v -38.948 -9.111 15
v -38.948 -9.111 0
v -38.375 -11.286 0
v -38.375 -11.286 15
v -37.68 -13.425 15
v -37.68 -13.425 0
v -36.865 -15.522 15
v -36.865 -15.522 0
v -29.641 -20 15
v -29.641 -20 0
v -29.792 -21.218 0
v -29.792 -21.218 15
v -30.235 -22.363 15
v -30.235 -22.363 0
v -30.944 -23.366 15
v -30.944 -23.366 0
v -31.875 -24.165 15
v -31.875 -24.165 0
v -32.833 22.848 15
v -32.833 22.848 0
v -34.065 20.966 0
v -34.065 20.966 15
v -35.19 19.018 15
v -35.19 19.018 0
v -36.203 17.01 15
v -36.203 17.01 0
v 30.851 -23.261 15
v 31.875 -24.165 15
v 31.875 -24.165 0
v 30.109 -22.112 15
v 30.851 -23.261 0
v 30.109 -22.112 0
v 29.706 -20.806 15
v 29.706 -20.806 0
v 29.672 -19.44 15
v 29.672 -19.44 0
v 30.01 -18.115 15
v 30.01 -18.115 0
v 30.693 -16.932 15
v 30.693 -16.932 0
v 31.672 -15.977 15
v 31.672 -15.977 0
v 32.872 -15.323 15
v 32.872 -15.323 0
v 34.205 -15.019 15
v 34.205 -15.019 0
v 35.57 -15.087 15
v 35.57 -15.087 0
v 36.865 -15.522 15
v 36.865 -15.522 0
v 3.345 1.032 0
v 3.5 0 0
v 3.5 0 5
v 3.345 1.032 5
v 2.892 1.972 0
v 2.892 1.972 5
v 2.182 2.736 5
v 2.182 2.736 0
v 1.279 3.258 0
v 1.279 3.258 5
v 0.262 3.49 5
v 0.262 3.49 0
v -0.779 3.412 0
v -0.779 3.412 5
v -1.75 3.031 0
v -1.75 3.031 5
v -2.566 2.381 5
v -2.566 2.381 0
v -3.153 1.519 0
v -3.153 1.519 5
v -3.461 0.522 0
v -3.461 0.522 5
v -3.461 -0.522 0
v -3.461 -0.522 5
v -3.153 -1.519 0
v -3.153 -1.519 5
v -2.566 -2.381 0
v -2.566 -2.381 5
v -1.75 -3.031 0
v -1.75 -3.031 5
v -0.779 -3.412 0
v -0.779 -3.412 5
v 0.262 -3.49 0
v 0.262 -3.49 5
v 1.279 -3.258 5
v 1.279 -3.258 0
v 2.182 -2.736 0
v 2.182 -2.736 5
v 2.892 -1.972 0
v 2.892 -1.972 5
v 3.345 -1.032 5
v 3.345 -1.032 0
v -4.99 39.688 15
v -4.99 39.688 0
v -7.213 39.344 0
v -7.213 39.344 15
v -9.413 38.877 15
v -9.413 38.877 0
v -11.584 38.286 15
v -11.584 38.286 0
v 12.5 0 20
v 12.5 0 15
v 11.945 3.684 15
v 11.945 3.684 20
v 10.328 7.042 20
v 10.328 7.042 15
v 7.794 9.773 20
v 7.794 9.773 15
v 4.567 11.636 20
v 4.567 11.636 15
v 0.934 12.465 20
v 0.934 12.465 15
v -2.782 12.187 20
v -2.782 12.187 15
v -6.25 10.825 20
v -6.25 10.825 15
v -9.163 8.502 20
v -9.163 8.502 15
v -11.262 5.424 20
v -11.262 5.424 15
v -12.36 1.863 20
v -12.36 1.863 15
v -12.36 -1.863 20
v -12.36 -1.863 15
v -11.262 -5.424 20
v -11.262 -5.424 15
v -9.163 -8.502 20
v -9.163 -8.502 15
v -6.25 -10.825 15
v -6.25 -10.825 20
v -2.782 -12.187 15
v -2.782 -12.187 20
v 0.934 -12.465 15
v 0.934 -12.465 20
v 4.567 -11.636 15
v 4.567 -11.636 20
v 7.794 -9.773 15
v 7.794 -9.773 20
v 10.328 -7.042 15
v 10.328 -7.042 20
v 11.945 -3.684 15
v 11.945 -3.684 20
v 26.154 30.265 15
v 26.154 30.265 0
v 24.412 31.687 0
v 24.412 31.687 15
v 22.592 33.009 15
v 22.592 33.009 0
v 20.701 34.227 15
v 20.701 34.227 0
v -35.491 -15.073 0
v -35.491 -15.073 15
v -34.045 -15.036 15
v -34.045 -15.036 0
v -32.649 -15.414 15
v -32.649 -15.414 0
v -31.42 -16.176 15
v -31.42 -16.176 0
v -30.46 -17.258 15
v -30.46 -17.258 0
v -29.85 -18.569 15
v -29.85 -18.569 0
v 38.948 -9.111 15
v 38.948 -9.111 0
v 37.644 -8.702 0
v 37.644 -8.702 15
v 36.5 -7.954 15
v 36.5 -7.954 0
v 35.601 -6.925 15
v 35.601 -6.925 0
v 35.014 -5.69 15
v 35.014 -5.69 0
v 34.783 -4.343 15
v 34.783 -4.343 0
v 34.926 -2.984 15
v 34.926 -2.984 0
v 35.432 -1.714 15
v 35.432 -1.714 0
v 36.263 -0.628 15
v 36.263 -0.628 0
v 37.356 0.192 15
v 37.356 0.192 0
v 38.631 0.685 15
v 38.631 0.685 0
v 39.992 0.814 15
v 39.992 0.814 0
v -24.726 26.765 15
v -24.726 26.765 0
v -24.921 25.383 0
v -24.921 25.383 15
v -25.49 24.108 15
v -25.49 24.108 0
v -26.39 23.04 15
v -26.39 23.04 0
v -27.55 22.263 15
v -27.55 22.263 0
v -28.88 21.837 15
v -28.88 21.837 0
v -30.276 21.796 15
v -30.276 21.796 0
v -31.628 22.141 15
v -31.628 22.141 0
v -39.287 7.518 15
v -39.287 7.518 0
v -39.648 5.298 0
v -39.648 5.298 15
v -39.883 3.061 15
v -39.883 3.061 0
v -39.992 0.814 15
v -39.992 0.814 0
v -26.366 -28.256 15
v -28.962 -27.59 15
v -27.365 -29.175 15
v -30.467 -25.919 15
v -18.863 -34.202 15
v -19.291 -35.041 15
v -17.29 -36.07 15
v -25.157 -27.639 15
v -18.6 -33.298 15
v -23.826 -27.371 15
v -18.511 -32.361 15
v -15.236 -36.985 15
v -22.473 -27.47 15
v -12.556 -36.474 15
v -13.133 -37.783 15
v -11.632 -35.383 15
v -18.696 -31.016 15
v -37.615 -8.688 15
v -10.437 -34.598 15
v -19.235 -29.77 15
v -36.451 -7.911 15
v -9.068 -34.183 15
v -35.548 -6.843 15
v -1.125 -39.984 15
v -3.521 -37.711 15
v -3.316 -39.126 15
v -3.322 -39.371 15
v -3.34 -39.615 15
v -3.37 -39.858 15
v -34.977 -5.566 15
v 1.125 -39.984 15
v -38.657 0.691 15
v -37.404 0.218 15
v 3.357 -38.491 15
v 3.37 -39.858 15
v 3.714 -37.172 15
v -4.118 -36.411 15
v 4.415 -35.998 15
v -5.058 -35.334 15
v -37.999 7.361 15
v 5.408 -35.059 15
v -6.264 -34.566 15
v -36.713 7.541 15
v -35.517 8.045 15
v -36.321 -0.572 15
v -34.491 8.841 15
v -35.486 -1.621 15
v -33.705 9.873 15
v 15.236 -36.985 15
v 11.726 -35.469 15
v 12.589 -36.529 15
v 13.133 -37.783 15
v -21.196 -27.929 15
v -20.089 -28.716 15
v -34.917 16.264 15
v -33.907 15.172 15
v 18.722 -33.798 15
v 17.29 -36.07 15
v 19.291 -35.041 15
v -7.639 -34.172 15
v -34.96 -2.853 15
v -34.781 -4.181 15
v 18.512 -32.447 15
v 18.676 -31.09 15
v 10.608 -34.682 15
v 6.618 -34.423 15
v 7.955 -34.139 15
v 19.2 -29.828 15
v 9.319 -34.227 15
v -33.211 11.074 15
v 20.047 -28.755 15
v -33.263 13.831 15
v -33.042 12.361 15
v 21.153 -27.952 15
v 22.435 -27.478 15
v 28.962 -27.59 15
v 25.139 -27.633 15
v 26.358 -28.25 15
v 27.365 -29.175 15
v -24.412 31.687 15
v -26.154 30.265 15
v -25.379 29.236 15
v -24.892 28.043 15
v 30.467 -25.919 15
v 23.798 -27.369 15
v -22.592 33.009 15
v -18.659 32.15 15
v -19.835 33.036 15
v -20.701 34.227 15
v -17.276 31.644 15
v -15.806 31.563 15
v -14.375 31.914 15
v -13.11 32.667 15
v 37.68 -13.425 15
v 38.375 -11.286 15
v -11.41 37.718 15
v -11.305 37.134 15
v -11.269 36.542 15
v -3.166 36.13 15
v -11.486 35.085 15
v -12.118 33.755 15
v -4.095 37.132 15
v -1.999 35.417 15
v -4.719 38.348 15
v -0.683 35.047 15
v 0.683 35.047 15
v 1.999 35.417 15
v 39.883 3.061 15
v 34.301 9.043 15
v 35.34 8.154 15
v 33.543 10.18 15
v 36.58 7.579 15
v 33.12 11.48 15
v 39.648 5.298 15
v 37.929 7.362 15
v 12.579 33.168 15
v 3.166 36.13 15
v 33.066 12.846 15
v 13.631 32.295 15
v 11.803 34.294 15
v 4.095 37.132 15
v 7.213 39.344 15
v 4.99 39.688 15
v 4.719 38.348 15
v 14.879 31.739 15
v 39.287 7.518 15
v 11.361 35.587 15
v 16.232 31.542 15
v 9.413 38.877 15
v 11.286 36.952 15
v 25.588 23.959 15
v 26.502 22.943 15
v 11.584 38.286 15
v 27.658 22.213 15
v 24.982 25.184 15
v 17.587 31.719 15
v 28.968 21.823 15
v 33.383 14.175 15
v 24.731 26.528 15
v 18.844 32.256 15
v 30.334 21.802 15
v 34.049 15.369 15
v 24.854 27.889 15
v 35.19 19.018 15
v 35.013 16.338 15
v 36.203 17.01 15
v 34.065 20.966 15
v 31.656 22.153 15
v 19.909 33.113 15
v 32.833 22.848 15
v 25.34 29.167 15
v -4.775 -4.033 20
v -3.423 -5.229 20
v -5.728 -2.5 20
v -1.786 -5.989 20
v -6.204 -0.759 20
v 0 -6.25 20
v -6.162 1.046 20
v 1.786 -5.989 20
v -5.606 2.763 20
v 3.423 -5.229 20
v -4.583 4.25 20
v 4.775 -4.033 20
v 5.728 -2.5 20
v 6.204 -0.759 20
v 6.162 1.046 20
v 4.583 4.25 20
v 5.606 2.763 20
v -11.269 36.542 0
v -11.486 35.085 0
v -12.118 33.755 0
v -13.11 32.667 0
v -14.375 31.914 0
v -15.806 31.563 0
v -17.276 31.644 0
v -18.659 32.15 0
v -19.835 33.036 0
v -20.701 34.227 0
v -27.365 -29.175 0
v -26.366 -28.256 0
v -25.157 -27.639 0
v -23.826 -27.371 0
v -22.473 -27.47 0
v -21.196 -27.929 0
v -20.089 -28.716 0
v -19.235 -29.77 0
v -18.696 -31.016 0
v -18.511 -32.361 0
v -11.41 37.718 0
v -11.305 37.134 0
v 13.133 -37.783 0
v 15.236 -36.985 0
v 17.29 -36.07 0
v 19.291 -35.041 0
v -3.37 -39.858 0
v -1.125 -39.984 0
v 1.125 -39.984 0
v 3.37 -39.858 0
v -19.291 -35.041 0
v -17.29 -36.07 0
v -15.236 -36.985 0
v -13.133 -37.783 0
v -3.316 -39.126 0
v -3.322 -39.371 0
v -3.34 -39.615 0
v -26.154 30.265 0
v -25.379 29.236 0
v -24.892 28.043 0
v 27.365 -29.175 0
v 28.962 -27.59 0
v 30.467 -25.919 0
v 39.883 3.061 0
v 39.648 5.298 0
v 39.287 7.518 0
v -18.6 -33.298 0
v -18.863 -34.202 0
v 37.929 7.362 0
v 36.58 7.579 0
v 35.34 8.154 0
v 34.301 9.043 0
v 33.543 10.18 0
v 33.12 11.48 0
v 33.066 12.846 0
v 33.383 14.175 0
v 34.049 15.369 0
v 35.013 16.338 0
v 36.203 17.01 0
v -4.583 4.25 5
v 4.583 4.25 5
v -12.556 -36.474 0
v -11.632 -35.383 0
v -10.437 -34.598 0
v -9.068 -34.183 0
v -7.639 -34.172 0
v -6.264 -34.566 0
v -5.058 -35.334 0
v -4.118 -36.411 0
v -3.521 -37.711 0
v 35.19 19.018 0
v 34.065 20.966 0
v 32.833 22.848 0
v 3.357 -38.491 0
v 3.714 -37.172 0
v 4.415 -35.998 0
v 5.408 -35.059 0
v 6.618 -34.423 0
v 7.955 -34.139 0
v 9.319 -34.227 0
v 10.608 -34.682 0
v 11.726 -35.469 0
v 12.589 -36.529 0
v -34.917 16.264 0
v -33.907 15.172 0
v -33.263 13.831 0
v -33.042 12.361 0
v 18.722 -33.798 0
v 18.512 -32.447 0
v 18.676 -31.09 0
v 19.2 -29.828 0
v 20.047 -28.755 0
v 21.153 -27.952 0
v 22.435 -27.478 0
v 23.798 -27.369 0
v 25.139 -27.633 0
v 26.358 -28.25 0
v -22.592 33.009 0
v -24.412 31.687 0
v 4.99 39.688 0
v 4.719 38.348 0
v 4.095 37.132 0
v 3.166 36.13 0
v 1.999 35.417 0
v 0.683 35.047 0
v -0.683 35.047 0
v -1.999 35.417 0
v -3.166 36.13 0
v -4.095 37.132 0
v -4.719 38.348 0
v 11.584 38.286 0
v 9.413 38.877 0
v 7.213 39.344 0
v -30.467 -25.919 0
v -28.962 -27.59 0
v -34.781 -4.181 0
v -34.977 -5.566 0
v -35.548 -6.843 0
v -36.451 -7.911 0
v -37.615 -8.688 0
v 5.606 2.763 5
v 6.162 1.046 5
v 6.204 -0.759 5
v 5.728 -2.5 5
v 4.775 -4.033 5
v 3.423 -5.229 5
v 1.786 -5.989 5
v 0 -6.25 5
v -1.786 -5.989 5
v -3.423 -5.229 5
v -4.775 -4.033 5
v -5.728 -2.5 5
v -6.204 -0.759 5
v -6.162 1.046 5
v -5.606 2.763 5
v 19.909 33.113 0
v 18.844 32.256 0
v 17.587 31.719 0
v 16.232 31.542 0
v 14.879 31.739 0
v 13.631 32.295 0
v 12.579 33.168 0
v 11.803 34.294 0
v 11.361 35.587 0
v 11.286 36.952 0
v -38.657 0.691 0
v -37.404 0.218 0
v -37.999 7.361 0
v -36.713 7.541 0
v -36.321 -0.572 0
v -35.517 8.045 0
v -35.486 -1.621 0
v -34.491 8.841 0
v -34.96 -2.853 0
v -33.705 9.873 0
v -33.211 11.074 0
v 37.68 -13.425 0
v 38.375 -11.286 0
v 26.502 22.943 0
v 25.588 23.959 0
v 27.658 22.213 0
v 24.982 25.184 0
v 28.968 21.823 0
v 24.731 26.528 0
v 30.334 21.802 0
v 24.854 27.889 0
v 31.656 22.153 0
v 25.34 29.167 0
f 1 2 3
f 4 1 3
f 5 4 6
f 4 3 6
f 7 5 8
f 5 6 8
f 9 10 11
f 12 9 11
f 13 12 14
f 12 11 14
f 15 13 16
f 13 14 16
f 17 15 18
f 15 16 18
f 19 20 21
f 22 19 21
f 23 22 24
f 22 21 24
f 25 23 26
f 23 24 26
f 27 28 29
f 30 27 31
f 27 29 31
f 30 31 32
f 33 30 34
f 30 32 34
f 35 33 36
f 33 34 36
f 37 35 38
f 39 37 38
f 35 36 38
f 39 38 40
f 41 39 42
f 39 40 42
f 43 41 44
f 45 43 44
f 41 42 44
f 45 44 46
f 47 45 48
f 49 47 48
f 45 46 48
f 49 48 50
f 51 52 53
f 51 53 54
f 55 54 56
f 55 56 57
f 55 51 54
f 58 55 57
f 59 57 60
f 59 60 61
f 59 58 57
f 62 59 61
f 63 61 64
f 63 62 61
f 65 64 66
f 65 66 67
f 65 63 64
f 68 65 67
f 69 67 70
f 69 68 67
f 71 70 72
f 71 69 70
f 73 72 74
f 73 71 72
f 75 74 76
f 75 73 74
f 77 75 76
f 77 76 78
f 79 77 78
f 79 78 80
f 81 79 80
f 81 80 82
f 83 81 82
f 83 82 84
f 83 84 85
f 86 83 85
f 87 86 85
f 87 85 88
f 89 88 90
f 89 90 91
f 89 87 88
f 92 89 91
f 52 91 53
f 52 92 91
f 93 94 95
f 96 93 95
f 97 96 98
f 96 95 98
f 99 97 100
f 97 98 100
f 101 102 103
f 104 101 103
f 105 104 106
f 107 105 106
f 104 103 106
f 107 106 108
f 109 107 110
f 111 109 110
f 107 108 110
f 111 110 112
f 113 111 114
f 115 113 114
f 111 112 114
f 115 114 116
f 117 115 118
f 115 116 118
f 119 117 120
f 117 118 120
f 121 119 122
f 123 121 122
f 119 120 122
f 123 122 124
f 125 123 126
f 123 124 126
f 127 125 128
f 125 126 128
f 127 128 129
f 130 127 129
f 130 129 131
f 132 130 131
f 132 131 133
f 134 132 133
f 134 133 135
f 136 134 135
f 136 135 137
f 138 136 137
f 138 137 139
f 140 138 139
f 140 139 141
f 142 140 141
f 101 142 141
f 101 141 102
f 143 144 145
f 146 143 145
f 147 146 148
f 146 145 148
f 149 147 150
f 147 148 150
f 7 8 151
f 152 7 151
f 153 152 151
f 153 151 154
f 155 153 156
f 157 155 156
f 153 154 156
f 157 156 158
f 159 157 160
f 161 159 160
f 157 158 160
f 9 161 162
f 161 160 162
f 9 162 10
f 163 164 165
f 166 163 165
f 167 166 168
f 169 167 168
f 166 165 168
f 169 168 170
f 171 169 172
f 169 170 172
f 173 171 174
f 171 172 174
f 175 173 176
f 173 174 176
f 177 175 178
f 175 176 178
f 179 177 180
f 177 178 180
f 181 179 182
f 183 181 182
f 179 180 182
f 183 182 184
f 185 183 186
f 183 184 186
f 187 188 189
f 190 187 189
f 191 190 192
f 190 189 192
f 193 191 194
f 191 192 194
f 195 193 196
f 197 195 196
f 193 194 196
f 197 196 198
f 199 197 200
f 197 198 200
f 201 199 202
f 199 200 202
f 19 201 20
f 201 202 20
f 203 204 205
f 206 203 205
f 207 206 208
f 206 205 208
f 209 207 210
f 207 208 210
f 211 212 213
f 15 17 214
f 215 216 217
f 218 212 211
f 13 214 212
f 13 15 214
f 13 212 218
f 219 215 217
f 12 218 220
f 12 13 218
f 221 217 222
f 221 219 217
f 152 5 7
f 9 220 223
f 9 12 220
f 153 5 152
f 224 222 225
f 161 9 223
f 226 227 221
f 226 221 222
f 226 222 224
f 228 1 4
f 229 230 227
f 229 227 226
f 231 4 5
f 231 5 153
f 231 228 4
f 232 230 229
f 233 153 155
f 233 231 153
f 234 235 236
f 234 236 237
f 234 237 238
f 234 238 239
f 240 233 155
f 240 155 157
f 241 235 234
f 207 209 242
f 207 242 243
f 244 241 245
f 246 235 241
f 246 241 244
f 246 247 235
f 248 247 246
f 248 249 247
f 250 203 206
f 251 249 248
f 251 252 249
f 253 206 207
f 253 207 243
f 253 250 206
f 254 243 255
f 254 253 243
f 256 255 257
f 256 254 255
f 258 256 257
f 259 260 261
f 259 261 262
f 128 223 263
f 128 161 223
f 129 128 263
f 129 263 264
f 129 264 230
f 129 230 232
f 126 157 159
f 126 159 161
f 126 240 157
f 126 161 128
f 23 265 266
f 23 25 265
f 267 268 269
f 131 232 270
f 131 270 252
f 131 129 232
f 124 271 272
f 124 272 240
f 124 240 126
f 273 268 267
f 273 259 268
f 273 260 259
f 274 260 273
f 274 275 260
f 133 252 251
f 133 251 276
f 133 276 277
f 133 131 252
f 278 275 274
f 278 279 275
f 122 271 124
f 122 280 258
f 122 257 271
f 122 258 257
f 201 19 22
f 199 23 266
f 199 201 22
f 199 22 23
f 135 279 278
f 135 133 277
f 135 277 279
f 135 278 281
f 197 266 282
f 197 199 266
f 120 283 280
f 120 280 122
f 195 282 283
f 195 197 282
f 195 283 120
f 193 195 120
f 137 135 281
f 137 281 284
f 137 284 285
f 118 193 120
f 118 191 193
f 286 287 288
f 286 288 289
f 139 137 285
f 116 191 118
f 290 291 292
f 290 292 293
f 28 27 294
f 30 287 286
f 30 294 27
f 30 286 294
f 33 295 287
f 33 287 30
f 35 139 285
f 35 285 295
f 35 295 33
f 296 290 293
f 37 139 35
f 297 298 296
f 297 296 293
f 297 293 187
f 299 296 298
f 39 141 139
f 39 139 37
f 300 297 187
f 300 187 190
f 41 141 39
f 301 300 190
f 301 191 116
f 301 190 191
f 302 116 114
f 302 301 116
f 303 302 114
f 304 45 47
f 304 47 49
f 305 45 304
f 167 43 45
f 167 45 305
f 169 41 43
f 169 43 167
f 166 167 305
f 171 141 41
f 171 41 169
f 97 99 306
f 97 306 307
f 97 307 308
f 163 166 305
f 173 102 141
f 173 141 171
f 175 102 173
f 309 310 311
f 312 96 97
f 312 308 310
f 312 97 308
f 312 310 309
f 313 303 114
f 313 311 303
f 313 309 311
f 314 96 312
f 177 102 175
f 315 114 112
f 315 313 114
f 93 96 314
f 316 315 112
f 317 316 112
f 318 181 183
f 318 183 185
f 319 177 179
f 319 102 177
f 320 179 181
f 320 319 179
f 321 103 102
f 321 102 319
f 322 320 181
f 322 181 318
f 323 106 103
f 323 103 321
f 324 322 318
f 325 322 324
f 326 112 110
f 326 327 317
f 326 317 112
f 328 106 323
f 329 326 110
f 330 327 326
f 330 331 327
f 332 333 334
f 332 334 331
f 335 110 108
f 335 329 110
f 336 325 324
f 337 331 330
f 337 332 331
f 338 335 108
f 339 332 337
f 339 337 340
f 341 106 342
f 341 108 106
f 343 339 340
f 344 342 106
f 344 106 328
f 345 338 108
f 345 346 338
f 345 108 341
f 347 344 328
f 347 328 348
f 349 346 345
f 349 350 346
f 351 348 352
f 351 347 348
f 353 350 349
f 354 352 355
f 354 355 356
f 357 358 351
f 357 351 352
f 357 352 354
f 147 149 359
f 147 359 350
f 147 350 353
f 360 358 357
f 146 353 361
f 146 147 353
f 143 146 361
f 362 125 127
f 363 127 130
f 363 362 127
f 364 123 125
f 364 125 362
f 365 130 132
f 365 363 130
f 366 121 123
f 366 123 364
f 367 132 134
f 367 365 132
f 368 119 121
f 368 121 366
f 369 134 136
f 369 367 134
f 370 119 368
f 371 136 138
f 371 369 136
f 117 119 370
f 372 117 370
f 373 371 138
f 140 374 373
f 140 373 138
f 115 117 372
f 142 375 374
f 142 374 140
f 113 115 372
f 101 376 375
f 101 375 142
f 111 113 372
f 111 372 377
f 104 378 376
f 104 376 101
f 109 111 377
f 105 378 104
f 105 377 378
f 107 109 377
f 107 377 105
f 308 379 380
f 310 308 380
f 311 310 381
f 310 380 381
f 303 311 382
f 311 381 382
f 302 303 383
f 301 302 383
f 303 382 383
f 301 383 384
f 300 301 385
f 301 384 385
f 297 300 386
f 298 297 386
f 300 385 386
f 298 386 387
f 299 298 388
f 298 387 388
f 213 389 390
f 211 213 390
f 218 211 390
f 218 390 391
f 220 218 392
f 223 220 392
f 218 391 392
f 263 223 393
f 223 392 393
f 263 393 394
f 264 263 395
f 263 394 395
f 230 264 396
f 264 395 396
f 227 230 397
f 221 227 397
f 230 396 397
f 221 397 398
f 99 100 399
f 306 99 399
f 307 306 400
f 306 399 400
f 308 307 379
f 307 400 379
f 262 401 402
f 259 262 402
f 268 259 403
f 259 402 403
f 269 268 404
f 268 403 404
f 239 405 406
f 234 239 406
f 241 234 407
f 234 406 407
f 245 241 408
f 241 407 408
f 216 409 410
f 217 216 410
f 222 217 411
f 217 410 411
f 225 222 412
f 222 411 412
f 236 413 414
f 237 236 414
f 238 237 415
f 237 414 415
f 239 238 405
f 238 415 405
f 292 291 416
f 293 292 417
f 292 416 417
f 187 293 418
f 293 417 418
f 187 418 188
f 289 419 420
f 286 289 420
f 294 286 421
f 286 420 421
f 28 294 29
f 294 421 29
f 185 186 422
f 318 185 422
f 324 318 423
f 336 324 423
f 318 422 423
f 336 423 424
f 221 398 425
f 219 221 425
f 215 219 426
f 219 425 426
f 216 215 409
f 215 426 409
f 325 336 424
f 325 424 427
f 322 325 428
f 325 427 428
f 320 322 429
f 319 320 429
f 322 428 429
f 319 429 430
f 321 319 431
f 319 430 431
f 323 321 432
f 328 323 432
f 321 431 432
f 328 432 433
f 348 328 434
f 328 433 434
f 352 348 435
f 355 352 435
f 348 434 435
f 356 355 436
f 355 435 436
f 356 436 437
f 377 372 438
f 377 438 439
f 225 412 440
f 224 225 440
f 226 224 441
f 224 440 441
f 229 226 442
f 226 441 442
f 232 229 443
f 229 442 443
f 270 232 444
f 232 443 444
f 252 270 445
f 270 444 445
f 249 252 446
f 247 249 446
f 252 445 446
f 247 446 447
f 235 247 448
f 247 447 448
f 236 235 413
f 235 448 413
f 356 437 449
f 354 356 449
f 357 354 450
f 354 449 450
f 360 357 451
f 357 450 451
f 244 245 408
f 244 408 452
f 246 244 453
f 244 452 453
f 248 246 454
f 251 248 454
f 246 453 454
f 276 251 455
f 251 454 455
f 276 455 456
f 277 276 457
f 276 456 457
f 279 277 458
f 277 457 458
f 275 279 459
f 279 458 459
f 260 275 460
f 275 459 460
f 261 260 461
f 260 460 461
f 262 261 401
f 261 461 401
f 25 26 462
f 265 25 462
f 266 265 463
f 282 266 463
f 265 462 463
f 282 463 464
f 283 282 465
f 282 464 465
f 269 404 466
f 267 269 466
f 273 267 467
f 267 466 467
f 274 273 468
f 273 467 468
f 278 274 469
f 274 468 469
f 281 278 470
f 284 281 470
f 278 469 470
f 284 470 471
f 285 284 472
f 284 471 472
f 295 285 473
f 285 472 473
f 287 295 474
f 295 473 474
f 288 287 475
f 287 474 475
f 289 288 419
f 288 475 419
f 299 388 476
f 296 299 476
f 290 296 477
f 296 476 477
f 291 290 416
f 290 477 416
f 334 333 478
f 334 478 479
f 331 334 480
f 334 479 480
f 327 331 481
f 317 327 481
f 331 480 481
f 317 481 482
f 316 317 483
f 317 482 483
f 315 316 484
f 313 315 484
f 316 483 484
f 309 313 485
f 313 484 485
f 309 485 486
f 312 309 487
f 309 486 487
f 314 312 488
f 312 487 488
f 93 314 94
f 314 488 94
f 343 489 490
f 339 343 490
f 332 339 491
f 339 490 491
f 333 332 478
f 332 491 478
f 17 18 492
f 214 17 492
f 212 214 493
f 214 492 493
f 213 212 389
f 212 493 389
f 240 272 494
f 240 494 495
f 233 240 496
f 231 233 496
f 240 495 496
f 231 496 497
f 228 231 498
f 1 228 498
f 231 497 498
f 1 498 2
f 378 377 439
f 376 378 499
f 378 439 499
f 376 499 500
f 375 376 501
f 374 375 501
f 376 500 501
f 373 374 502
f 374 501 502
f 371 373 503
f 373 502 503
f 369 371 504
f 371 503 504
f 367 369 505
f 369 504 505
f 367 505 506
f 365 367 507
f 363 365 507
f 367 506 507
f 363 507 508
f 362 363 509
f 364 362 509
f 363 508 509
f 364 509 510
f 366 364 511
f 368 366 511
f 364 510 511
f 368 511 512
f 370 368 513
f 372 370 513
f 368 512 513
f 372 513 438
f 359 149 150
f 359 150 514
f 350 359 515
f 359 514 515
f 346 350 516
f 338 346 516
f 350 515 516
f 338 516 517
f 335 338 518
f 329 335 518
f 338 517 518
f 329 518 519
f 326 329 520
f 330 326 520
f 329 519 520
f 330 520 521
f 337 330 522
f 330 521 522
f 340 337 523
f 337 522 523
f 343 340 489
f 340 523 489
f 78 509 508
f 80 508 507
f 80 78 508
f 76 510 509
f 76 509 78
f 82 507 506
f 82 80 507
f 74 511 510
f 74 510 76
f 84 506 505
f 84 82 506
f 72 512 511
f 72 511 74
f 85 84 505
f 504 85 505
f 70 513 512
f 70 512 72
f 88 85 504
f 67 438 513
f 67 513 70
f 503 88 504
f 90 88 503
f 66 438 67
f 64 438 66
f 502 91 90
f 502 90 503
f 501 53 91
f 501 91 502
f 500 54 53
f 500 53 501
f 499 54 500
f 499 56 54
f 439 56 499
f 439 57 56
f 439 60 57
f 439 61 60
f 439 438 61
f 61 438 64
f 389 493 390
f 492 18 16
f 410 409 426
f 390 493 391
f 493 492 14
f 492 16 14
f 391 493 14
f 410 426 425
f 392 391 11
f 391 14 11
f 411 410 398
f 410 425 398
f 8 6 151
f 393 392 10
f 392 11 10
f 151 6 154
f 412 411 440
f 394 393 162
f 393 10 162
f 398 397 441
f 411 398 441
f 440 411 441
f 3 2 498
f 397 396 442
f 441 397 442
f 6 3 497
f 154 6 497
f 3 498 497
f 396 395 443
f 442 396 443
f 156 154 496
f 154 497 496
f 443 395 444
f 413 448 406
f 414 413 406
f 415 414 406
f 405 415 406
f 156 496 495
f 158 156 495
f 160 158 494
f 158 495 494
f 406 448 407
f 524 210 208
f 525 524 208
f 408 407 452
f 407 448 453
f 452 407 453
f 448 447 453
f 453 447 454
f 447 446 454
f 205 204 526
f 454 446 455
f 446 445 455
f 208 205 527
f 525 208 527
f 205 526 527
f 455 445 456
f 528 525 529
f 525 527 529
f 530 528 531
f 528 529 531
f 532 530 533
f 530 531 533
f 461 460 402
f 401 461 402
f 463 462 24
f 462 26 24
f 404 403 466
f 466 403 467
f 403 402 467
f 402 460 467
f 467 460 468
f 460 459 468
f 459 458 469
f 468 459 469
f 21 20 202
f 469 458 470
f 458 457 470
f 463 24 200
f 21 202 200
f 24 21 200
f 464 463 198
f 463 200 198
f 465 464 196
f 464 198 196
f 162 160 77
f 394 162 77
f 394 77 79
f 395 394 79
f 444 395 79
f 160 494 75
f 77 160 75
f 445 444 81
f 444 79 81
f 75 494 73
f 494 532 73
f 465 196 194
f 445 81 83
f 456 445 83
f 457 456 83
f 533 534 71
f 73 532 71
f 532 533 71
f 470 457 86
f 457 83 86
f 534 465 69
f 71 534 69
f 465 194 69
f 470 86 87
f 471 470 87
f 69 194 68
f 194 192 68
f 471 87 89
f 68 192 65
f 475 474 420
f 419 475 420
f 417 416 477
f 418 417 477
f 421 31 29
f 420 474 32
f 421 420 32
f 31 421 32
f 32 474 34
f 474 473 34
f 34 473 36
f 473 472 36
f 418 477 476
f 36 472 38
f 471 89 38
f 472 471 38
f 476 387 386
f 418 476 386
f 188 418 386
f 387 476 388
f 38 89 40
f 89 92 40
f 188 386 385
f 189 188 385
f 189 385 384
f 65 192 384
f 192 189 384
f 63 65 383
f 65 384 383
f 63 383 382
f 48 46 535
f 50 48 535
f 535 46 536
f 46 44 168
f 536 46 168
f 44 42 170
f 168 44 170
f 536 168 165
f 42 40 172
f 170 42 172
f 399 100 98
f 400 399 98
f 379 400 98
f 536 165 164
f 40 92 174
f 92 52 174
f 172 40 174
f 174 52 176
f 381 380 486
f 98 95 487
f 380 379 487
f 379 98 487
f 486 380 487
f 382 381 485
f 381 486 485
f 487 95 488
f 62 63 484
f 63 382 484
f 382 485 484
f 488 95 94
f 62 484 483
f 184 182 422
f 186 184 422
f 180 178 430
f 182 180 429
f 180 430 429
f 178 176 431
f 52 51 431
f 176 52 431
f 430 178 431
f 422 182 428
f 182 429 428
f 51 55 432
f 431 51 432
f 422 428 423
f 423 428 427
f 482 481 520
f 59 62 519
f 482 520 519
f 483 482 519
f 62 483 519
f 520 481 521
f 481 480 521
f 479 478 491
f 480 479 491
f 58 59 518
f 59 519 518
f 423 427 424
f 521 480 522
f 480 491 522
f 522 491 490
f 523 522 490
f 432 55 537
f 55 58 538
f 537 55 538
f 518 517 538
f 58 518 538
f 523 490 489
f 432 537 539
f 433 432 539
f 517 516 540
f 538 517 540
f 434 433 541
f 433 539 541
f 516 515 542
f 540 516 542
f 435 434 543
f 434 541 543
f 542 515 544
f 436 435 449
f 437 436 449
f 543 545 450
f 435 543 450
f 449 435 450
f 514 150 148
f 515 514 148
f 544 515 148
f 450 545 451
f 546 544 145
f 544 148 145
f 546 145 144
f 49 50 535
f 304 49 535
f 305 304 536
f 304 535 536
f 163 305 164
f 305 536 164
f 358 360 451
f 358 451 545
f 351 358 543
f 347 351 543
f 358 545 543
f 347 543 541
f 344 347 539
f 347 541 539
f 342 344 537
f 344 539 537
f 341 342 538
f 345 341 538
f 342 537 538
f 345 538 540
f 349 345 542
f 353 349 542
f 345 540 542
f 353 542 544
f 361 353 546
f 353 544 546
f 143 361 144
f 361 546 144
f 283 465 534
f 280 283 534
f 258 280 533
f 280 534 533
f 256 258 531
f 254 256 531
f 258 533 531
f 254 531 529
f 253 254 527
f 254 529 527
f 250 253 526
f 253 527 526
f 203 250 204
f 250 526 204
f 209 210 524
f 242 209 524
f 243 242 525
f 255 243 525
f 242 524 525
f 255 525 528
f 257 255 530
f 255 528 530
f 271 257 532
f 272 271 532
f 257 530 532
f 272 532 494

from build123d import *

# Parameters (mm, degrees)
F0_R     = 12.5
F1_DEPTH = 15
F2_DEPTH = 20
F3_R     = 10
F3_R_2   = 3.5
F4_DEPTH = 5
F5_DEPTH = 15
F6_DEPTH = 20


with BuildPart() as f1:
    # F0 (on Top) → F1 (new body)
    with BuildSketch(Plane.XY):
        with BuildLine():
            ThreePointArc((38.948467, -9.111361), (34.808266, -3.658496), (39.991708, 0.814414))
            ThreePointArc((39.991708, 0.814414), (39.780876, 4.181139), (39.28712, 7.518126))
            ThreePointArc((39.28712, 7.518126), (33.286978, 10.815595), (36.202991, 17.010098))
            ThreePointArc((36.202991, 17.010098), (34.641016, 20), (32.832672, 22.847661))
            ThreePointArc((32.832672, 22.847661), (26.010069, 23.419571), (26.154448, 30.264581))
            ThreePointArc((26.154448, 30.264581), (23.51141, 32.36068), (20.701158, 34.226628))
            ThreePointArc((20.701158, 34.226628), (14.235783, 31.974091), (11.583563, 38.286043))
            ThreePointArc((11.583563, 38.286043), (8.316468, 39.125904), (4.990225, 39.6875))
            ThreePointArc((4.990225, 39.6875), (0, 35), (-4.990225, 39.6875))
            ThreePointArc((-4.990225, 39.6875), (-8.316468, 39.125904), (-11.583563, 38.286043))
            ThreePointArc((-11.583563, 38.286043), (-11.348617, 37.427958), (-11.269466, 36.541818))
            ThreePointArc((-11.269466, 36.541818), (-15.077505, 31.685973), (-20.701158, 34.226628))
            ThreePointArc((-20.701158, 34.226628), (-23.51141, 32.36068), (-26.154448, 30.264581))
            ThreePointArc((-26.154448, 30.264581), (-25.096715, 28.655102), (-24.725793, 26.765224))
            ThreePointArc((-24.725793, 26.765224), (-27.550293, 22.263314), (-32.832672, 22.847661))
            ThreePointArc((-32.832672, 22.847661), (-34.641016, 20), (-36.202991, 17.010098))
            ThreePointArc((-36.202991, 17.010098), (-33.907267, 15.171699), (-33.042261, 12.36068))
            ThreePointArc((-33.042261, 12.36068), (-34.9783, 8.409459), (-39.28712, 7.518126))
            ThreePointArc((-39.28712, 7.518126), (-39.780876, 4.181139), (-39.991708, 0.814414))
            ThreePointArc((-39.991708, 0.814414), (-36.320685, -0.571834), (-34.780876, -4.181139))
            ThreePointArc((-34.780876, -4.181139), (-35.962365, -7.408983), (-38.948467, -9.111361))
            ThreePointArc((-38.948467, -9.111361), (-38.042261, -12.36068), (-36.865496, -15.522089))
            ThreePointArc((-36.865496, -15.522089), (-32.006856, -15.750153), (-29.641016, -20))
            ThreePointArc((-29.641016, -20), (-30.234843, -22.363395), (-31.875271, -24.165411))
            ThreePointArc((-31.875271, -24.165411), (-29.725793, -26.765224), (-27.364904, -29.174681))
            ThreePointArc((-27.364904, -29.174681), (-21.818405, -27.656029), (-18.51141, -32.36068))
            ThreePointArc((-18.51141, -32.36068), (-18.710145, -33.756334), (-19.290551, -35.041043))
            ThreePointArc((-19.290551, -35.041043), (-16.269466, -36.541818), (-13.132672, -37.782707))
            ThreePointArc((-13.132672, -37.782707), (-7.638611, -34.172066), (-3.316468, -39.125904))
            ThreePointArc((-3.316468, -39.125904), (-3.329949, -39.492821), (-3.370319, -39.857759))
            ThreePointArc((-3.370319, -39.857759), (0, -40), (3.370319, -39.857759))
            ThreePointArc((3.370319, -39.857759), (7.276909, -34.235166), (13.132672, -37.782707))
            ThreePointArc((13.132672, -37.782707), (16.269466, -36.541818), (19.290551, -35.041043))
            ThreePointArc((19.290551, -35.041043), (20.572484, -28.315595), (27.364904, -29.174681))
            ThreePointArc((27.364904, -29.174681), (29.725793, -26.765224), (31.875271, -24.165411))
            ThreePointArc((31.875271, -24.165411), (30.310889, -17.5), (36.865496, -15.522089))
            ThreePointArc((36.865496, -15.522089), (38.042261, -12.36068), (38.948467, -9.111361))
        make_face()
        Circle(F0_R, mode=Mode.SUBTRACT)
    extrude(amount=F1_DEPTH)

    # F0 (on Top) → F2 (join)
    with BuildSketch(Plane.XY):
        Circle(F0_R)
        with BuildLine():
            ThreePointArc((4.582576, 4.25), (0, -6.25), (-4.582576, 4.25))
            Line((-4.582576, 4.25), (4.582576, 4.25))
        make_face(mode=Mode.SUBTRACT)
    extrude(amount=F2_DEPTH)

    # F3 (on Top) → F4 (join)
    with BuildSketch(Plane.XY):
        Circle(F3_R)
        Circle(F3_R_2, mode=Mode.SUBTRACT)
    extrude(amount=F4_DEPTH)



with BuildPart() as f5:
    # F0 (on Top) → F5 (new body)
    with BuildSketch(Plane.XY):
        with BuildLine():
            ThreePointArc((38.948467, -9.111361), (34.808266, -3.658496), (39.991708, 0.814414))
            ThreePointArc((39.991708, 0.814414), (39.780876, 4.181139), (39.28712, 7.518126))
            ThreePointArc((39.28712, 7.518126), (33.286978, 10.815595), (36.202991, 17.010098))
            ThreePointArc((36.202991, 17.010098), (34.641016, 20), (32.832672, 22.847661))
            ThreePointArc((32.832672, 22.847661), (26.010069, 23.419571), (26.154448, 30.264581))
            ThreePointArc((26.154448, 30.264581), (23.51141, 32.36068), (20.701158, 34.226628))
            ThreePointArc((20.701158, 34.226628), (14.235783, 31.974091), (11.583563, 38.286043))
            ThreePointArc((11.583563, 38.286043), (8.316468, 39.125904), (4.990225, 39.6875))
            ThreePointArc((4.990225, 39.6875), (0, 35), (-4.990225, 39.6875))
            ThreePointArc((-4.990225, 39.6875), (-8.316468, 39.125904), (-11.583563, 38.286043))
            ThreePointArc((-11.583563, 38.286043), (-11.348617, 37.427958), (-11.269466, 36.541818))
            ThreePointArc((-11.269466, 36.541818), (-15.077505, 31.685973), (-20.701158, 34.226628))
            ThreePointArc((-20.701158, 34.226628), (-23.51141, 32.36068), (-26.154448, 30.264581))
            ThreePointArc((-26.154448, 30.264581), (-25.096715, 28.655102), (-24.725793, 26.765224))
            ThreePointArc((-24.725793, 26.765224), (-27.550293, 22.263314), (-32.832672, 22.847661))
            ThreePointArc((-32.832672, 22.847661), (-34.641016, 20), (-36.202991, 17.010098))
            ThreePointArc((-36.202991, 17.010098), (-33.907267, 15.171699), (-33.042261, 12.36068))
            ThreePointArc((-33.042261, 12.36068), (-34.9783, 8.409459), (-39.28712, 7.518126))
            ThreePointArc((-39.28712, 7.518126), (-39.780876, 4.181139), (-39.991708, 0.814414))
            ThreePointArc((-39.991708, 0.814414), (-36.320685, -0.571834), (-34.780876, -4.181139))
            ThreePointArc((-34.780876, -4.181139), (-35.962365, -7.408983), (-38.948467, -9.111361))
            ThreePointArc((-38.948467, -9.111361), (-38.042261, -12.36068), (-36.865496, -15.522089))
            ThreePointArc((-36.865496, -15.522089), (-32.006856, -15.750153), (-29.641016, -20))
            ThreePointArc((-29.641016, -20), (-30.234843, -22.363395), (-31.875271, -24.165411))
            ThreePointArc((-31.875271, -24.165411), (-29.725793, -26.765224), (-27.364904, -29.174681))
            ThreePointArc((-27.364904, -29.174681), (-21.818405, -27.656029), (-18.51141, -32.36068))
            ThreePointArc((-18.51141, -32.36068), (-18.710145, -33.756334), (-19.290551, -35.041043))
            ThreePointArc((-19.290551, -35.041043), (-16.269466, -36.541818), (-13.132672, -37.782707))
            ThreePointArc((-13.132672, -37.782707), (-7.638611, -34.172066), (-3.316468, -39.125904))
            ThreePointArc((-3.316468, -39.125904), (-3.329949, -39.492821), (-3.370319, -39.857759))
            ThreePointArc((-3.370319, -39.857759), (0, -40), (3.370319, -39.857759))
            ThreePointArc((3.370319, -39.857759), (7.276909, -34.235166), (13.132672, -37.782707))
            ThreePointArc((13.132672, -37.782707), (16.269466, -36.541818), (19.290551, -35.041043))
            ThreePointArc((19.290551, -35.041043), (20.572484, -28.315595), (27.364904, -29.174681))
            ThreePointArc((27.364904, -29.174681), (29.725793, -26.765224), (31.875271, -24.165411))
            ThreePointArc((31.875271, -24.165411), (30.310889, -17.5), (36.865496, -15.522089))
            ThreePointArc((36.865496, -15.522089), (38.042261, -12.36068), (38.948467, -9.111361))
        make_face()
        Circle(F0_R, mode=Mode.SUBTRACT)
    extrude(amount=F5_DEPTH)


with BuildPart() as f1_1:
    add(f1.part)

    add(f5.part)  # F6 merges F5
    # F0 (on Top) → F6 (join)
    with BuildSketch(Plane.XY):
        Circle(F0_R)
        with BuildLine():
            ThreePointArc((4.582576, 4.25), (0, -6.25), (-4.582576, 4.25))
            Line((-4.582576, 4.25), (4.582576, 4.25))
        make_face(mode=Mode.SUBTRACT)
    extrude(amount=F6_DEPTH)


solid = f1_1.part
